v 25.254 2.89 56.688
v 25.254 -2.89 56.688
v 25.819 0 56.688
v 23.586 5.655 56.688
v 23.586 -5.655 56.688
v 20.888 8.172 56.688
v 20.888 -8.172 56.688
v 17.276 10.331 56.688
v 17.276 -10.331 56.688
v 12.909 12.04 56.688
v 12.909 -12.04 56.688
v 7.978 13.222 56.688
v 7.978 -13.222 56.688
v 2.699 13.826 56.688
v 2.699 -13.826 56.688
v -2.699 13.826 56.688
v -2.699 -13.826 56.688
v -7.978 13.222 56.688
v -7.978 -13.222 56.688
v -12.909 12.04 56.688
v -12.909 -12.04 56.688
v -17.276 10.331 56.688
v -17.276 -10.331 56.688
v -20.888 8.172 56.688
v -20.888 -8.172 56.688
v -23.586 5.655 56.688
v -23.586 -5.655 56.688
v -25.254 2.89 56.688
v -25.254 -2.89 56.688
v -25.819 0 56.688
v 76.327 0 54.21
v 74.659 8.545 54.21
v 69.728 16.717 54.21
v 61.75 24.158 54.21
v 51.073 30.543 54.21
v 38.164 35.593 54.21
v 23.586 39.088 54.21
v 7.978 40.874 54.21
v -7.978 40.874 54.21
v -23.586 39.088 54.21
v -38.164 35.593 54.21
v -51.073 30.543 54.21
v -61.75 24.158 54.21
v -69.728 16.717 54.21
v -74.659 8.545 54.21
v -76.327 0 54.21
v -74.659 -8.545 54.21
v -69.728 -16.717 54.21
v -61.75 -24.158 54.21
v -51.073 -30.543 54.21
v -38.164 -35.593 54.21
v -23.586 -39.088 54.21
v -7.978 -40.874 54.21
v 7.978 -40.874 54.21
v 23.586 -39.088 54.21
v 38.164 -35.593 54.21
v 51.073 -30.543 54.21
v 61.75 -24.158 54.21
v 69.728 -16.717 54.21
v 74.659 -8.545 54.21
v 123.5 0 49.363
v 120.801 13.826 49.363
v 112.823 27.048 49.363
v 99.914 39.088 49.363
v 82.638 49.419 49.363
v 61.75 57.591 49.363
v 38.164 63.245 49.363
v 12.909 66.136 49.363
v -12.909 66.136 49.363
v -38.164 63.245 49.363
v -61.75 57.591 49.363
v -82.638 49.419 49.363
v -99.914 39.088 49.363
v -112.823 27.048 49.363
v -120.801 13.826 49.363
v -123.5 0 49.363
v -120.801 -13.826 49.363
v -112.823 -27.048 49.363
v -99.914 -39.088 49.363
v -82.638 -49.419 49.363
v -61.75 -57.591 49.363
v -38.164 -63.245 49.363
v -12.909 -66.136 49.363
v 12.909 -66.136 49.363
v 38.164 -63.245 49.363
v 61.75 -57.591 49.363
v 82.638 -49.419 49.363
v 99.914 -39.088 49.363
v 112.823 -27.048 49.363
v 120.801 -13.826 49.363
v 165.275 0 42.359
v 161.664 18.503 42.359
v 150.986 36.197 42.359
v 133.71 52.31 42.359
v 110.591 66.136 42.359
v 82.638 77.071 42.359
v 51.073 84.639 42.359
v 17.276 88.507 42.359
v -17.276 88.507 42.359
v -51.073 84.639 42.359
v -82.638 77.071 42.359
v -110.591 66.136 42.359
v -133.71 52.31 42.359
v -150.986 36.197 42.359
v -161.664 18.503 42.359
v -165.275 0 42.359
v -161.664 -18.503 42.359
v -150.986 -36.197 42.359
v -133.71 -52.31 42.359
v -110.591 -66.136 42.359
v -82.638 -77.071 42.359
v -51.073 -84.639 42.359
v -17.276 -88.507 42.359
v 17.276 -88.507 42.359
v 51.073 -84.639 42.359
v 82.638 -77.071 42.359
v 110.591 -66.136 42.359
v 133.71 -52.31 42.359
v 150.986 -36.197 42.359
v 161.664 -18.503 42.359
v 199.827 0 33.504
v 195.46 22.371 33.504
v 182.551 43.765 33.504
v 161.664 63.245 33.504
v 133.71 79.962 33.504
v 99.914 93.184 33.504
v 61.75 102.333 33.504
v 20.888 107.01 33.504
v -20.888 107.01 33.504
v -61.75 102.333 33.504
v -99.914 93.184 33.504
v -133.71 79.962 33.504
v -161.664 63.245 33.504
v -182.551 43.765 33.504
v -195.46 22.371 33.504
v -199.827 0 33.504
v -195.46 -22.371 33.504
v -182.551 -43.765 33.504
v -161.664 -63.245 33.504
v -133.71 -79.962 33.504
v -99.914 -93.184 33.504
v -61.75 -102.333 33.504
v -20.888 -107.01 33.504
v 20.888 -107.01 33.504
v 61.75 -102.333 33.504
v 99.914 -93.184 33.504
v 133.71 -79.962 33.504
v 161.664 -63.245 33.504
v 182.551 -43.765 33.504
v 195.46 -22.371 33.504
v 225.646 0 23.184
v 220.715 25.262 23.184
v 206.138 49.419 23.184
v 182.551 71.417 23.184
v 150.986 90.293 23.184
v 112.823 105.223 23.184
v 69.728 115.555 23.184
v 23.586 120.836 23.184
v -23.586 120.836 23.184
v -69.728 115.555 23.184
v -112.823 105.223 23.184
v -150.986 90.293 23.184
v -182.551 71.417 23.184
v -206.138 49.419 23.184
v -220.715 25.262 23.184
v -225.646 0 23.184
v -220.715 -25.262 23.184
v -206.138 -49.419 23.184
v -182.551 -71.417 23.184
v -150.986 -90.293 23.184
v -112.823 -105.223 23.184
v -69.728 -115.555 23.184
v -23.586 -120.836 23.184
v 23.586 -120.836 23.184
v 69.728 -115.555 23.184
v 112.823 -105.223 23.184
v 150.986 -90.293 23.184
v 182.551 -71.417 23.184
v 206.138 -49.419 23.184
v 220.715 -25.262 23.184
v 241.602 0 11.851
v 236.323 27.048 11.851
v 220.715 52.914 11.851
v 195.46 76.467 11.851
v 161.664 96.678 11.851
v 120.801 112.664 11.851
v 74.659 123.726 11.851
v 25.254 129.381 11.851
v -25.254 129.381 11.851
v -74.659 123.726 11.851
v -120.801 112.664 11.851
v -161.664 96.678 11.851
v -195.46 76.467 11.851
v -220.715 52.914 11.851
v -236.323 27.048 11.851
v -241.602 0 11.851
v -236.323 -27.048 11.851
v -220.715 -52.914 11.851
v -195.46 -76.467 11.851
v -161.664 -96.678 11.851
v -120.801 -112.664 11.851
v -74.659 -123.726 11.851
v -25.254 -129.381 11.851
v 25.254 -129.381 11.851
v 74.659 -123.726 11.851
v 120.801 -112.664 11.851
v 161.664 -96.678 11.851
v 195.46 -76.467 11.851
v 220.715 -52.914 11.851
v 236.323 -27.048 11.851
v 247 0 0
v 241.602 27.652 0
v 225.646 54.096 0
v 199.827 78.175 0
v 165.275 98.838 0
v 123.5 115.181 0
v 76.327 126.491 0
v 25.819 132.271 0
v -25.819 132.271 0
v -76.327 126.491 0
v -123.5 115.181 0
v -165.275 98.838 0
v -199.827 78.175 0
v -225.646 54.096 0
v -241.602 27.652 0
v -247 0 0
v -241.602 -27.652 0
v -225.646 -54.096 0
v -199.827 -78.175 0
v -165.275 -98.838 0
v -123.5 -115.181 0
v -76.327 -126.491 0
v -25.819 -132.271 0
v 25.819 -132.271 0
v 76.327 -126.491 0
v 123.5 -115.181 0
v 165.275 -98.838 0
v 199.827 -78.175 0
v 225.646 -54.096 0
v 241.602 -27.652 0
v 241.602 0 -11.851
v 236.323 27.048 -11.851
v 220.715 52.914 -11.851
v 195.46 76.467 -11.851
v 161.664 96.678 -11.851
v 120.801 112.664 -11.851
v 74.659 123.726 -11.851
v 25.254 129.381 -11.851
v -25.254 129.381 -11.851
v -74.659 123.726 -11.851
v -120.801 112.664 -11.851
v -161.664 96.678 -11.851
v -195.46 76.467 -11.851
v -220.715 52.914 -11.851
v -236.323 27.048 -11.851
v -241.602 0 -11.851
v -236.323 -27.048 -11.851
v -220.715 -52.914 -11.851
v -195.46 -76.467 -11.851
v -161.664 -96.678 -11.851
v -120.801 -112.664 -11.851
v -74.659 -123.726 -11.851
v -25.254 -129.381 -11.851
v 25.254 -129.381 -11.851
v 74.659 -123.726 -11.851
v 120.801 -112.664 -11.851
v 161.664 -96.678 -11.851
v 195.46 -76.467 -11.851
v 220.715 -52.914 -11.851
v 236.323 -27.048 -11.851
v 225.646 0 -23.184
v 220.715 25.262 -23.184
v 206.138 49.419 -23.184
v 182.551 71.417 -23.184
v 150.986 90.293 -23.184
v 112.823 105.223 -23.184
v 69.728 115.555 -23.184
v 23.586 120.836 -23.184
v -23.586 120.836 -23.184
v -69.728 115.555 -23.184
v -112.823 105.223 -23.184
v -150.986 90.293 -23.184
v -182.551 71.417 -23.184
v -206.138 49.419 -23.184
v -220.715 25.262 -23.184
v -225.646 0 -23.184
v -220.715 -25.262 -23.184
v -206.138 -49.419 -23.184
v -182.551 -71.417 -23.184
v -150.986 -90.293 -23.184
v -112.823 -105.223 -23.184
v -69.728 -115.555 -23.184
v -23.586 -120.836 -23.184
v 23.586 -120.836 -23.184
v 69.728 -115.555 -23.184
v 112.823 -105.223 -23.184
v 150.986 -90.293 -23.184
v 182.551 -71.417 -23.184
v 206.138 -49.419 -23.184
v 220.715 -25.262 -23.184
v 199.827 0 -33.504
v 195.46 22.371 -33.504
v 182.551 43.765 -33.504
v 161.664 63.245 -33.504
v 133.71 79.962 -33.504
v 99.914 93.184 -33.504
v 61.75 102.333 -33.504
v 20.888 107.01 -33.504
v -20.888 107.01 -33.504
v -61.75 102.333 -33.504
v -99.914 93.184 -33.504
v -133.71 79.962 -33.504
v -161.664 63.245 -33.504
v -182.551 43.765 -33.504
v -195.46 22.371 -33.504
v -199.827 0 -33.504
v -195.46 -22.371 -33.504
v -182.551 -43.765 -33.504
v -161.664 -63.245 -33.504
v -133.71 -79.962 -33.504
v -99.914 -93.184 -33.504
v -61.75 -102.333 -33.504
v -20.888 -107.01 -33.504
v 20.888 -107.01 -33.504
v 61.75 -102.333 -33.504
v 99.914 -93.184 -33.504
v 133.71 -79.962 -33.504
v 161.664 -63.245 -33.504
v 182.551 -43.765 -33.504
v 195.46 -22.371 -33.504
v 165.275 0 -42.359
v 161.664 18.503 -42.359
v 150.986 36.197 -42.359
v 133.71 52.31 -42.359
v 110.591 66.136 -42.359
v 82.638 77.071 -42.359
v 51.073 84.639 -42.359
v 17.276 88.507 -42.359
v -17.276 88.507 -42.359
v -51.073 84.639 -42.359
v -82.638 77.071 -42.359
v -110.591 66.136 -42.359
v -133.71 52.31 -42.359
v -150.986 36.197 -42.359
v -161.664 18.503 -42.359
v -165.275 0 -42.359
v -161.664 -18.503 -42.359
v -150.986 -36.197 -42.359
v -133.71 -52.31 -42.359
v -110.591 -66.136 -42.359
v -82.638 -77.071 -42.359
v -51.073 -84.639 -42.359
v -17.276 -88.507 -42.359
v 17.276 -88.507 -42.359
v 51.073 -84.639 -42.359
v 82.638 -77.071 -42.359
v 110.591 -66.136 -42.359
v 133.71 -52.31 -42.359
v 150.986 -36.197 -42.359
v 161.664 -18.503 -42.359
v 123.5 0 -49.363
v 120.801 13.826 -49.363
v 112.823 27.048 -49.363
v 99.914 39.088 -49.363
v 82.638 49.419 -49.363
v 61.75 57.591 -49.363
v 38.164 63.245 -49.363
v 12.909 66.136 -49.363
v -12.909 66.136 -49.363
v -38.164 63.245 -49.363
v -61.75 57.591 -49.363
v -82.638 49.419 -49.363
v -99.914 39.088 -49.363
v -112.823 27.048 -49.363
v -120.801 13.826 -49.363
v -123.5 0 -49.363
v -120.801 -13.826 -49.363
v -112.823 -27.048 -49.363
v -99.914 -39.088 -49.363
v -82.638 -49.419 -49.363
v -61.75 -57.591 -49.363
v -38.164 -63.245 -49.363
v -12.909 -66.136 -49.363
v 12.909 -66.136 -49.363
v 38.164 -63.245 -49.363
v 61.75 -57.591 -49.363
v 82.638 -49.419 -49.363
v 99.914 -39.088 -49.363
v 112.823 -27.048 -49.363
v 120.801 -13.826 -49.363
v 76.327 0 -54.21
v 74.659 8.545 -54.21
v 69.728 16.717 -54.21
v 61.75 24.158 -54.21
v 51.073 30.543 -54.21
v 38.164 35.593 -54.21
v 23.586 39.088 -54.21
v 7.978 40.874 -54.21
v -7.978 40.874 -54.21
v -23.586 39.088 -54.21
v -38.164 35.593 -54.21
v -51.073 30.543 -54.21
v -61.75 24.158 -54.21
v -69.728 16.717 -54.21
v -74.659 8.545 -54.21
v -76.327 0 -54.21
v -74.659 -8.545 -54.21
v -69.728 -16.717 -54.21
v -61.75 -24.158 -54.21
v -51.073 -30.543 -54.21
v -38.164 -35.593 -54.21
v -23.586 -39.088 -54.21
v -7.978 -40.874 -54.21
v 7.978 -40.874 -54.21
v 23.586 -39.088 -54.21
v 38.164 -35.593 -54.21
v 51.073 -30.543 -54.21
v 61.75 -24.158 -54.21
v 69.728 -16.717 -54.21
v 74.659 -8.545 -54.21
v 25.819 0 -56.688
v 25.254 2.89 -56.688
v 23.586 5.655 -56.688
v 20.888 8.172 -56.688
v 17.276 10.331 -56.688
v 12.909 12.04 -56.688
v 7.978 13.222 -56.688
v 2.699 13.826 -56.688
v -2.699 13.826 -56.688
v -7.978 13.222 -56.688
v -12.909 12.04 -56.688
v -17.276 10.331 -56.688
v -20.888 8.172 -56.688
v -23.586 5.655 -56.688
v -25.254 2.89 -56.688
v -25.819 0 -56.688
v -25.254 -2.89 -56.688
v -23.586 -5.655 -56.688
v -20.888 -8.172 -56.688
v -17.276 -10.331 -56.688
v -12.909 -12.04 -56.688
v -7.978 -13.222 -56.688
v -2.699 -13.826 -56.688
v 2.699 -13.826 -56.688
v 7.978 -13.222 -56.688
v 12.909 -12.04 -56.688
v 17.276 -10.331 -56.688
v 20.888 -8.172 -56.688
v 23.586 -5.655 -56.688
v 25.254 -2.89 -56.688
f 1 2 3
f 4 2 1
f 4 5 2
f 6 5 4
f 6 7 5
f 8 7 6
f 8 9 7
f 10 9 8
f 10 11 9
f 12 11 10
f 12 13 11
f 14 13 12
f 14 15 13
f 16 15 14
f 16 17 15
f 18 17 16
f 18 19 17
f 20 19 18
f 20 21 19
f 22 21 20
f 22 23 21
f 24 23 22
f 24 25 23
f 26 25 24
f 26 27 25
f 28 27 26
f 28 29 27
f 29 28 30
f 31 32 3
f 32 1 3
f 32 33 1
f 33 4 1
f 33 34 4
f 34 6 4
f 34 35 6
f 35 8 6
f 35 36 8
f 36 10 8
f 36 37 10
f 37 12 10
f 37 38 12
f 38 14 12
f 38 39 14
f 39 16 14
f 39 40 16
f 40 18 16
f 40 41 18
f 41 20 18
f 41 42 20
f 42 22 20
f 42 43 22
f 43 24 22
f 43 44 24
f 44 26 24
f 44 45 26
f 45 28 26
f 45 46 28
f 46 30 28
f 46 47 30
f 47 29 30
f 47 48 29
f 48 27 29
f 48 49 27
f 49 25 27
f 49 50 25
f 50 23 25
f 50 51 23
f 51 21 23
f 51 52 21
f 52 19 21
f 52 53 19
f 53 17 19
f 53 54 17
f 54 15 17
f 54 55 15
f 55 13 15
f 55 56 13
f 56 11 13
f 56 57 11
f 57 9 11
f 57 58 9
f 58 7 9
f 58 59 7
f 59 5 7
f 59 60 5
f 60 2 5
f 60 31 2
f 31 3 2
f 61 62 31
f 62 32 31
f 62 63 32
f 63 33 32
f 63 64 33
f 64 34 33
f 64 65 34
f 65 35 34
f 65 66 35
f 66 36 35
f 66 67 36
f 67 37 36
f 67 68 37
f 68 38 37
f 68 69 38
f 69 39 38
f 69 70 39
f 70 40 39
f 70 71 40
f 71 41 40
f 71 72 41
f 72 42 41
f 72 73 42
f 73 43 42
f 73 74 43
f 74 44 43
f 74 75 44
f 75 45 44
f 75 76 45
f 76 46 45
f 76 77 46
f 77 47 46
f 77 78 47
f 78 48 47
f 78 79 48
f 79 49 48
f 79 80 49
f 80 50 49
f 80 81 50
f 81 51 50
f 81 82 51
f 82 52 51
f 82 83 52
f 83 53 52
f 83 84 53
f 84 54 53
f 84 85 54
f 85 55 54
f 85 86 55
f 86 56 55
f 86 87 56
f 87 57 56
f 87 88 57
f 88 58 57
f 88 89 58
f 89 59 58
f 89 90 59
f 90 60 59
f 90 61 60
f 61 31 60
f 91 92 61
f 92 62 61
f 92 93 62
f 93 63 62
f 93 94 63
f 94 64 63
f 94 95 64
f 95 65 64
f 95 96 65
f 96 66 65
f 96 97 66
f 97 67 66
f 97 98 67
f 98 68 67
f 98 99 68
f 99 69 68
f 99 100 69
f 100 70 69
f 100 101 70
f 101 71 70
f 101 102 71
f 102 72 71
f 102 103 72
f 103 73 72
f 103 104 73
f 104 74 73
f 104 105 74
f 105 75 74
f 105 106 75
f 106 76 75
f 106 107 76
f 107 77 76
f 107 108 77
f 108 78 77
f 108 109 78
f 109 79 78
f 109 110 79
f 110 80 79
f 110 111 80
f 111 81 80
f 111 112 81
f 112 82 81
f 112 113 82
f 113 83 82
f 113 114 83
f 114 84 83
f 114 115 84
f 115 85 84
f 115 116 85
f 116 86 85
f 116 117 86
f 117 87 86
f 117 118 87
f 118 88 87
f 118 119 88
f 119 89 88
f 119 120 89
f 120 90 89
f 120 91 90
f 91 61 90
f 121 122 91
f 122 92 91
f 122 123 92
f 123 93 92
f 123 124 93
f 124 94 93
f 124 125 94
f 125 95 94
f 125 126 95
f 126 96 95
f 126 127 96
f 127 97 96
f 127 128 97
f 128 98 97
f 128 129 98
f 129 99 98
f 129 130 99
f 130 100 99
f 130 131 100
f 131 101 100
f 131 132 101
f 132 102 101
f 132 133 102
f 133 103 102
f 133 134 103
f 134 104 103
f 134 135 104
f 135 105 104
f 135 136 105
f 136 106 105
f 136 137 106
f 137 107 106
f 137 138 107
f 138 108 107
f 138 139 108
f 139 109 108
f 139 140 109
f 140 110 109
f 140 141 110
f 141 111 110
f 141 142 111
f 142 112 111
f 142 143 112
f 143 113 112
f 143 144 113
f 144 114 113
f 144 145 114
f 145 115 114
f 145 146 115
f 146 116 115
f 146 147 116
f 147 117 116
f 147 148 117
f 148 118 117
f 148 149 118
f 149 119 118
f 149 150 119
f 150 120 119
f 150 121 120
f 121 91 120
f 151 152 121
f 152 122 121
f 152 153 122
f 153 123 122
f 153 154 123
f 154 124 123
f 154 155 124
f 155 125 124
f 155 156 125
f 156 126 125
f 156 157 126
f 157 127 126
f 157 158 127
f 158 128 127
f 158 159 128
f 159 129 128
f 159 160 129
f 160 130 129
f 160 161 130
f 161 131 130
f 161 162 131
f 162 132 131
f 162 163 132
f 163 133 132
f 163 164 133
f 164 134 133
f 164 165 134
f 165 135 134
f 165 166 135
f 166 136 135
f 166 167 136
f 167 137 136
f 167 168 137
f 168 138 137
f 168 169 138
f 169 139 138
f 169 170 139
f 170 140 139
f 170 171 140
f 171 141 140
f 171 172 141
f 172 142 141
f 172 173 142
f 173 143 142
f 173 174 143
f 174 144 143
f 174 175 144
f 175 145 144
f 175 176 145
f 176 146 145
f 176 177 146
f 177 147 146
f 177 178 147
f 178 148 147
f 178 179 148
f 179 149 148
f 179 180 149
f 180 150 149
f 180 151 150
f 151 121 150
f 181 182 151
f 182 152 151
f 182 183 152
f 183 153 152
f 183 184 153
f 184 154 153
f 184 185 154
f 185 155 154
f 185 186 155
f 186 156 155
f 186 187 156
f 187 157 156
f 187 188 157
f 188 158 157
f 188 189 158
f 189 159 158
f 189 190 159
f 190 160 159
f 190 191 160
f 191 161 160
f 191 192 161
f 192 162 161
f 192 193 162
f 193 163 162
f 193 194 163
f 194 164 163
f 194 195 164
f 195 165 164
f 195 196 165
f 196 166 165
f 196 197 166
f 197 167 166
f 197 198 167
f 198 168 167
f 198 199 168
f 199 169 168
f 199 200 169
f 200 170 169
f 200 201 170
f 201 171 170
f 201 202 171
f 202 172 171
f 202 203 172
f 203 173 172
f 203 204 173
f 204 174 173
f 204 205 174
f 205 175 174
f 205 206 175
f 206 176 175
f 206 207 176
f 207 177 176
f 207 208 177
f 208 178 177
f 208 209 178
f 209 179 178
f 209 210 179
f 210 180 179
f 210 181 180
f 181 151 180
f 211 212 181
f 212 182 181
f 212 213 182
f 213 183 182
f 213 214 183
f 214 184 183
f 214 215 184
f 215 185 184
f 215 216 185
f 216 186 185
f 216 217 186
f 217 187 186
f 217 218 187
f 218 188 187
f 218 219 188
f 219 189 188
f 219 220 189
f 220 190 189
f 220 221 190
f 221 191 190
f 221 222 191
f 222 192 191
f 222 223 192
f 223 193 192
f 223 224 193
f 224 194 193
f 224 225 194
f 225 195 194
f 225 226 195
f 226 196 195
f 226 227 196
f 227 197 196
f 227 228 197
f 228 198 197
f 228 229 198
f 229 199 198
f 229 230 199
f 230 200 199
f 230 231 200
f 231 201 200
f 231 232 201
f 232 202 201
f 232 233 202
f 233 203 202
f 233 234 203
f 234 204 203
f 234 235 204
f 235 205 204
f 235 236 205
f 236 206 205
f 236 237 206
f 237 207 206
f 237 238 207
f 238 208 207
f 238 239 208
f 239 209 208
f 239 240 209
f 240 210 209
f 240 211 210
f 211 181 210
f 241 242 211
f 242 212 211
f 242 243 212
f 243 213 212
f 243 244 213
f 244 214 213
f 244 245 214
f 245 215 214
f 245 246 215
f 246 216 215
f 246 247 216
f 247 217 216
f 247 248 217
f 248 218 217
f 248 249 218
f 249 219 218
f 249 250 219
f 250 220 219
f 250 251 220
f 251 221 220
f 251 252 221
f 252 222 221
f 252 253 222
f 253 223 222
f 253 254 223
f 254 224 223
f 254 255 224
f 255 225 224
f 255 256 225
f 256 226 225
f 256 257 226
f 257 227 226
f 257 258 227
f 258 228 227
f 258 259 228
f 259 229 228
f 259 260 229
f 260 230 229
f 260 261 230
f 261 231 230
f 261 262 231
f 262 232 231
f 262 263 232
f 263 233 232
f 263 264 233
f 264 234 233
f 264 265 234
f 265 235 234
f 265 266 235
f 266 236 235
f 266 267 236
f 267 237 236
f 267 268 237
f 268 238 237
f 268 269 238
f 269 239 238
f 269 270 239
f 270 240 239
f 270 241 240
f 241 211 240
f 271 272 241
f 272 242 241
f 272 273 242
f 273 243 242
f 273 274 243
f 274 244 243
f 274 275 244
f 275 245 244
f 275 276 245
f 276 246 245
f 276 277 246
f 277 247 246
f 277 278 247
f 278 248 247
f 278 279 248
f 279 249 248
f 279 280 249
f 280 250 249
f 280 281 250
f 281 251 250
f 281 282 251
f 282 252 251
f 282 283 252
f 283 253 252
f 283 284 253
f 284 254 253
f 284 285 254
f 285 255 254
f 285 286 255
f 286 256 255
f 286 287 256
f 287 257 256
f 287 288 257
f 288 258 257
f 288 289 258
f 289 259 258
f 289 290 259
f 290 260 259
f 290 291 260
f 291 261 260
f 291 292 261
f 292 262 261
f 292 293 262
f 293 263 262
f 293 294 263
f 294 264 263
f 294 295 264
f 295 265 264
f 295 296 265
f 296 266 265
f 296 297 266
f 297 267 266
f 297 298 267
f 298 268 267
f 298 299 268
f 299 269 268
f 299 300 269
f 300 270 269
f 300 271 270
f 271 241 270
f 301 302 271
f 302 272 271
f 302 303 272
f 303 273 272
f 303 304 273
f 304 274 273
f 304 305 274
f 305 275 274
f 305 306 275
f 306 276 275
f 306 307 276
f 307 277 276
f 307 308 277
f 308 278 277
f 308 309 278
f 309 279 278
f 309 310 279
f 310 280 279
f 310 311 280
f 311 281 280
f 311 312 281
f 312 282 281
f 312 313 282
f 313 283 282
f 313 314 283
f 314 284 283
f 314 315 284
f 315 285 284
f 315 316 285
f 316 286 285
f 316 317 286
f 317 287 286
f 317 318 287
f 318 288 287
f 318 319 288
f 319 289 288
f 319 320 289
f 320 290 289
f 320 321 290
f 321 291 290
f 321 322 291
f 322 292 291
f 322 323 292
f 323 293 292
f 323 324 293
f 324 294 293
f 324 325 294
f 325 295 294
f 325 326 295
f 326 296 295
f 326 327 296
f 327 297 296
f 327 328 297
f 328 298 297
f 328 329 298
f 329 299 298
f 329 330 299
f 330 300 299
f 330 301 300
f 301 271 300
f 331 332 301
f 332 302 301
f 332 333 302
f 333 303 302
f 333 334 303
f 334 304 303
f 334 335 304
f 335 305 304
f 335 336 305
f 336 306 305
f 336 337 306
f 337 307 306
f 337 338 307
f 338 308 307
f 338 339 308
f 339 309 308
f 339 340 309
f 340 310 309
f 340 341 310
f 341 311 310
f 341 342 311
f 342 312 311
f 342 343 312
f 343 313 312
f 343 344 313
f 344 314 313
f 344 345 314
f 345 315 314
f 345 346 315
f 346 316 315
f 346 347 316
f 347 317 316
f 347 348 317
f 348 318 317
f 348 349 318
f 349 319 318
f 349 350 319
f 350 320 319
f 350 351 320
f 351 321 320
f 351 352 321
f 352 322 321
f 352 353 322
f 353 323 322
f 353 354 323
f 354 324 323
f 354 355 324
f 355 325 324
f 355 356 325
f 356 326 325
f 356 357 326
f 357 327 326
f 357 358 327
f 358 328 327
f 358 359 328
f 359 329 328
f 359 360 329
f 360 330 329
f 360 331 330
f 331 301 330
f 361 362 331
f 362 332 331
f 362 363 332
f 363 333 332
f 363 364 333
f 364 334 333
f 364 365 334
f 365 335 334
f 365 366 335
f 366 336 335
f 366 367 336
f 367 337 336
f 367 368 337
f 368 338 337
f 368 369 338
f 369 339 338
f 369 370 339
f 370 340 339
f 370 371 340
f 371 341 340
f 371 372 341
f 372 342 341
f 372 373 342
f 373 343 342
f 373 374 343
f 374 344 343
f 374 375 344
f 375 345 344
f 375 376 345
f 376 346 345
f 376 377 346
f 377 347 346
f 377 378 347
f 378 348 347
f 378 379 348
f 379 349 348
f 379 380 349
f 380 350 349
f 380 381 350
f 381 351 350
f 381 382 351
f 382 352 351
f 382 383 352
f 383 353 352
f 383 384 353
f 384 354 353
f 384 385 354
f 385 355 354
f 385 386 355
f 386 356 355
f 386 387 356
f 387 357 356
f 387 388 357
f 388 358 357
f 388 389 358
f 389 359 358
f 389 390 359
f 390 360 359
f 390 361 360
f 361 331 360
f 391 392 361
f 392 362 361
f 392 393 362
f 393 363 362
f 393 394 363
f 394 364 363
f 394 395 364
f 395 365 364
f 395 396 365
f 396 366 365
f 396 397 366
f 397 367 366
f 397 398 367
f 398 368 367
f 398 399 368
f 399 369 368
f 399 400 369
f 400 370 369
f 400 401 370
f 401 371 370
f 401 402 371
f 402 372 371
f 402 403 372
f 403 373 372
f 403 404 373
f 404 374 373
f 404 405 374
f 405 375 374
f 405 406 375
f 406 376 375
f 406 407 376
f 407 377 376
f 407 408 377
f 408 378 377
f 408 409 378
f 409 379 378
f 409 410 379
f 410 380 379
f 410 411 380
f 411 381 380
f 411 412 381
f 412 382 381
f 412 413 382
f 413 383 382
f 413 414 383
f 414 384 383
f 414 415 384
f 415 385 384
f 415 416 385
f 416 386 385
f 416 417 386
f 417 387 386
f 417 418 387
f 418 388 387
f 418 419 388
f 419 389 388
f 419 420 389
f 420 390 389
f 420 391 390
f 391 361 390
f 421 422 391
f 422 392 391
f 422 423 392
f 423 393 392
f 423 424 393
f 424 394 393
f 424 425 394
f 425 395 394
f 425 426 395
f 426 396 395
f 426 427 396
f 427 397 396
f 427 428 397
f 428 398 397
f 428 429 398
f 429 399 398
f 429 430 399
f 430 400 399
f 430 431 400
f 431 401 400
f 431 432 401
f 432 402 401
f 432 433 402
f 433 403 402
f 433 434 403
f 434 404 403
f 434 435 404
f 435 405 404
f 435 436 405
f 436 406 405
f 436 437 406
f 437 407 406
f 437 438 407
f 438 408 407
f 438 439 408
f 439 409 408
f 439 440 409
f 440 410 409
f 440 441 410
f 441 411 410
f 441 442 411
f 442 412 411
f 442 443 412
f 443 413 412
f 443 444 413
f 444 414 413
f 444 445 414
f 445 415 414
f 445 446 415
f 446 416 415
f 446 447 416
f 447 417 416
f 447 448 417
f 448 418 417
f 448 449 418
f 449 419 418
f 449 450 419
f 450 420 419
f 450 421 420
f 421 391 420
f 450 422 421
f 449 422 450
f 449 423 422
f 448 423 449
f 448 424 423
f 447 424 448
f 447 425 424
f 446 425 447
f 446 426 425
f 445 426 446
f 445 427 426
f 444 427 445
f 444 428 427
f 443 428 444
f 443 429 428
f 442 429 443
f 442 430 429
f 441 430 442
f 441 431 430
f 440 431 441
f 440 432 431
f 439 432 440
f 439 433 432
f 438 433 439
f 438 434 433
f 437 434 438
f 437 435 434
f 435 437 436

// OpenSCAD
// Generated by SolidPython 1.0.1 on 2020-07-29 00:46:50


scale(v = [13, 7, 3]) {
	sphere(r = 19);
}
/***********************************************
*********      SolidPython code:      **********
************************************************
 
# import packages: SolidPython
from solid import *
from solid.utils import *
from itertools import chain, combinations, permutations


class Resize:

    def __init__(self, scad_file):
        self.scad_file = scad_file
        #self.scad_file = import_scad(scad_file)
        # cone/cylinder param:
        self.r1 = 0
        self.r2 = 0
        self.h = 0
        # rectangular prism param:
        self.w = 0
        self.l = 0
        # ellipse param:
        self.r = 0

    # import OpenScad code (file name corresponds to shape)


    # classify shape + parameters
    def assign(self, param1, param2, param3):
        if self.scad_file == 'cone.scad':
            self.r1 = param1
            self.r2 = param2
            self.h = param3
        elif self.scad_file == 'cylinder.scad':
            self.r1 = param1
            self.r2 = param2
            self.h = param3
        elif self.scad_file == 'rectangularPrism.scad':
            self.h = param1
            self.l = param2
            self.w = param3
        else:
            self.r = param1
            self.h = param2

    # resize parameters
    def iterate(self):
        x = range(3, 20, 2)
        i = 1
        if self.scad_file == 'cone.scad':
            tempList = list(permutations(x, 2))
            for temp in tempList:
                param1 = temp[0]
                param2 = temp[1]
                filepath = 'produced_scad_files/' + 'cone' + str(param1) + '_' + str(param2) + '_' + '.scad'
                scad_render_to_file(cylinder(h=param1, r1=param2, r2=0), filepath)

        elif self.scad_file == 'cylinder.scad':
            tempList = list(permutations(x, 3))
            for temp in tempList:
                param1 = temp[0]
                param2 = temp[1]
                filepath = 'produced_scad_files/' + 'cylinder' + str(param1) + '_' + str(param2) + '_' + '.scad'
                scad_render_to_file(cylinder(h=param1, r1=param2, r2=param2), filepath)

        elif self.scad_file == 'rectangularPrism.scad':
            tempList = list(permutations(x, 3))
            for temp in tempList:
                param1 = temp[0]
                param2 = temp[1]
                param3 = temp[2]
                filepath = 'produced_scad_files/' + 'rectangularPrism' + str(param1) + '_' + str(param2) + '_' + str(
                    param3) + '.scad'
                scad_render_to_file(cube(size=(param1, param2, param3)), filepath)

        elif self.scad_file == 'ellipse.scad':
            tempList = list(permutations(x, 4))
            for temp in tempList:
                param1 = temp[0]
                param2 = temp[1]
                param3 = temp[2]
                param4 = temp[3]
                filepath = 'produced_scad_files/' + 'ellipse' + str(param1) + '_' + str(param2) + '_' + str(param3) + '_' + str(param4) + '.scad'
                scad_render_to_file(scale([param1, param2, param3])(sphere(r=param4)), filepath)

    def render_to_scadfile(self):
        scad_render_to_file(scad, 'example.scad') 
 
************************************************/
